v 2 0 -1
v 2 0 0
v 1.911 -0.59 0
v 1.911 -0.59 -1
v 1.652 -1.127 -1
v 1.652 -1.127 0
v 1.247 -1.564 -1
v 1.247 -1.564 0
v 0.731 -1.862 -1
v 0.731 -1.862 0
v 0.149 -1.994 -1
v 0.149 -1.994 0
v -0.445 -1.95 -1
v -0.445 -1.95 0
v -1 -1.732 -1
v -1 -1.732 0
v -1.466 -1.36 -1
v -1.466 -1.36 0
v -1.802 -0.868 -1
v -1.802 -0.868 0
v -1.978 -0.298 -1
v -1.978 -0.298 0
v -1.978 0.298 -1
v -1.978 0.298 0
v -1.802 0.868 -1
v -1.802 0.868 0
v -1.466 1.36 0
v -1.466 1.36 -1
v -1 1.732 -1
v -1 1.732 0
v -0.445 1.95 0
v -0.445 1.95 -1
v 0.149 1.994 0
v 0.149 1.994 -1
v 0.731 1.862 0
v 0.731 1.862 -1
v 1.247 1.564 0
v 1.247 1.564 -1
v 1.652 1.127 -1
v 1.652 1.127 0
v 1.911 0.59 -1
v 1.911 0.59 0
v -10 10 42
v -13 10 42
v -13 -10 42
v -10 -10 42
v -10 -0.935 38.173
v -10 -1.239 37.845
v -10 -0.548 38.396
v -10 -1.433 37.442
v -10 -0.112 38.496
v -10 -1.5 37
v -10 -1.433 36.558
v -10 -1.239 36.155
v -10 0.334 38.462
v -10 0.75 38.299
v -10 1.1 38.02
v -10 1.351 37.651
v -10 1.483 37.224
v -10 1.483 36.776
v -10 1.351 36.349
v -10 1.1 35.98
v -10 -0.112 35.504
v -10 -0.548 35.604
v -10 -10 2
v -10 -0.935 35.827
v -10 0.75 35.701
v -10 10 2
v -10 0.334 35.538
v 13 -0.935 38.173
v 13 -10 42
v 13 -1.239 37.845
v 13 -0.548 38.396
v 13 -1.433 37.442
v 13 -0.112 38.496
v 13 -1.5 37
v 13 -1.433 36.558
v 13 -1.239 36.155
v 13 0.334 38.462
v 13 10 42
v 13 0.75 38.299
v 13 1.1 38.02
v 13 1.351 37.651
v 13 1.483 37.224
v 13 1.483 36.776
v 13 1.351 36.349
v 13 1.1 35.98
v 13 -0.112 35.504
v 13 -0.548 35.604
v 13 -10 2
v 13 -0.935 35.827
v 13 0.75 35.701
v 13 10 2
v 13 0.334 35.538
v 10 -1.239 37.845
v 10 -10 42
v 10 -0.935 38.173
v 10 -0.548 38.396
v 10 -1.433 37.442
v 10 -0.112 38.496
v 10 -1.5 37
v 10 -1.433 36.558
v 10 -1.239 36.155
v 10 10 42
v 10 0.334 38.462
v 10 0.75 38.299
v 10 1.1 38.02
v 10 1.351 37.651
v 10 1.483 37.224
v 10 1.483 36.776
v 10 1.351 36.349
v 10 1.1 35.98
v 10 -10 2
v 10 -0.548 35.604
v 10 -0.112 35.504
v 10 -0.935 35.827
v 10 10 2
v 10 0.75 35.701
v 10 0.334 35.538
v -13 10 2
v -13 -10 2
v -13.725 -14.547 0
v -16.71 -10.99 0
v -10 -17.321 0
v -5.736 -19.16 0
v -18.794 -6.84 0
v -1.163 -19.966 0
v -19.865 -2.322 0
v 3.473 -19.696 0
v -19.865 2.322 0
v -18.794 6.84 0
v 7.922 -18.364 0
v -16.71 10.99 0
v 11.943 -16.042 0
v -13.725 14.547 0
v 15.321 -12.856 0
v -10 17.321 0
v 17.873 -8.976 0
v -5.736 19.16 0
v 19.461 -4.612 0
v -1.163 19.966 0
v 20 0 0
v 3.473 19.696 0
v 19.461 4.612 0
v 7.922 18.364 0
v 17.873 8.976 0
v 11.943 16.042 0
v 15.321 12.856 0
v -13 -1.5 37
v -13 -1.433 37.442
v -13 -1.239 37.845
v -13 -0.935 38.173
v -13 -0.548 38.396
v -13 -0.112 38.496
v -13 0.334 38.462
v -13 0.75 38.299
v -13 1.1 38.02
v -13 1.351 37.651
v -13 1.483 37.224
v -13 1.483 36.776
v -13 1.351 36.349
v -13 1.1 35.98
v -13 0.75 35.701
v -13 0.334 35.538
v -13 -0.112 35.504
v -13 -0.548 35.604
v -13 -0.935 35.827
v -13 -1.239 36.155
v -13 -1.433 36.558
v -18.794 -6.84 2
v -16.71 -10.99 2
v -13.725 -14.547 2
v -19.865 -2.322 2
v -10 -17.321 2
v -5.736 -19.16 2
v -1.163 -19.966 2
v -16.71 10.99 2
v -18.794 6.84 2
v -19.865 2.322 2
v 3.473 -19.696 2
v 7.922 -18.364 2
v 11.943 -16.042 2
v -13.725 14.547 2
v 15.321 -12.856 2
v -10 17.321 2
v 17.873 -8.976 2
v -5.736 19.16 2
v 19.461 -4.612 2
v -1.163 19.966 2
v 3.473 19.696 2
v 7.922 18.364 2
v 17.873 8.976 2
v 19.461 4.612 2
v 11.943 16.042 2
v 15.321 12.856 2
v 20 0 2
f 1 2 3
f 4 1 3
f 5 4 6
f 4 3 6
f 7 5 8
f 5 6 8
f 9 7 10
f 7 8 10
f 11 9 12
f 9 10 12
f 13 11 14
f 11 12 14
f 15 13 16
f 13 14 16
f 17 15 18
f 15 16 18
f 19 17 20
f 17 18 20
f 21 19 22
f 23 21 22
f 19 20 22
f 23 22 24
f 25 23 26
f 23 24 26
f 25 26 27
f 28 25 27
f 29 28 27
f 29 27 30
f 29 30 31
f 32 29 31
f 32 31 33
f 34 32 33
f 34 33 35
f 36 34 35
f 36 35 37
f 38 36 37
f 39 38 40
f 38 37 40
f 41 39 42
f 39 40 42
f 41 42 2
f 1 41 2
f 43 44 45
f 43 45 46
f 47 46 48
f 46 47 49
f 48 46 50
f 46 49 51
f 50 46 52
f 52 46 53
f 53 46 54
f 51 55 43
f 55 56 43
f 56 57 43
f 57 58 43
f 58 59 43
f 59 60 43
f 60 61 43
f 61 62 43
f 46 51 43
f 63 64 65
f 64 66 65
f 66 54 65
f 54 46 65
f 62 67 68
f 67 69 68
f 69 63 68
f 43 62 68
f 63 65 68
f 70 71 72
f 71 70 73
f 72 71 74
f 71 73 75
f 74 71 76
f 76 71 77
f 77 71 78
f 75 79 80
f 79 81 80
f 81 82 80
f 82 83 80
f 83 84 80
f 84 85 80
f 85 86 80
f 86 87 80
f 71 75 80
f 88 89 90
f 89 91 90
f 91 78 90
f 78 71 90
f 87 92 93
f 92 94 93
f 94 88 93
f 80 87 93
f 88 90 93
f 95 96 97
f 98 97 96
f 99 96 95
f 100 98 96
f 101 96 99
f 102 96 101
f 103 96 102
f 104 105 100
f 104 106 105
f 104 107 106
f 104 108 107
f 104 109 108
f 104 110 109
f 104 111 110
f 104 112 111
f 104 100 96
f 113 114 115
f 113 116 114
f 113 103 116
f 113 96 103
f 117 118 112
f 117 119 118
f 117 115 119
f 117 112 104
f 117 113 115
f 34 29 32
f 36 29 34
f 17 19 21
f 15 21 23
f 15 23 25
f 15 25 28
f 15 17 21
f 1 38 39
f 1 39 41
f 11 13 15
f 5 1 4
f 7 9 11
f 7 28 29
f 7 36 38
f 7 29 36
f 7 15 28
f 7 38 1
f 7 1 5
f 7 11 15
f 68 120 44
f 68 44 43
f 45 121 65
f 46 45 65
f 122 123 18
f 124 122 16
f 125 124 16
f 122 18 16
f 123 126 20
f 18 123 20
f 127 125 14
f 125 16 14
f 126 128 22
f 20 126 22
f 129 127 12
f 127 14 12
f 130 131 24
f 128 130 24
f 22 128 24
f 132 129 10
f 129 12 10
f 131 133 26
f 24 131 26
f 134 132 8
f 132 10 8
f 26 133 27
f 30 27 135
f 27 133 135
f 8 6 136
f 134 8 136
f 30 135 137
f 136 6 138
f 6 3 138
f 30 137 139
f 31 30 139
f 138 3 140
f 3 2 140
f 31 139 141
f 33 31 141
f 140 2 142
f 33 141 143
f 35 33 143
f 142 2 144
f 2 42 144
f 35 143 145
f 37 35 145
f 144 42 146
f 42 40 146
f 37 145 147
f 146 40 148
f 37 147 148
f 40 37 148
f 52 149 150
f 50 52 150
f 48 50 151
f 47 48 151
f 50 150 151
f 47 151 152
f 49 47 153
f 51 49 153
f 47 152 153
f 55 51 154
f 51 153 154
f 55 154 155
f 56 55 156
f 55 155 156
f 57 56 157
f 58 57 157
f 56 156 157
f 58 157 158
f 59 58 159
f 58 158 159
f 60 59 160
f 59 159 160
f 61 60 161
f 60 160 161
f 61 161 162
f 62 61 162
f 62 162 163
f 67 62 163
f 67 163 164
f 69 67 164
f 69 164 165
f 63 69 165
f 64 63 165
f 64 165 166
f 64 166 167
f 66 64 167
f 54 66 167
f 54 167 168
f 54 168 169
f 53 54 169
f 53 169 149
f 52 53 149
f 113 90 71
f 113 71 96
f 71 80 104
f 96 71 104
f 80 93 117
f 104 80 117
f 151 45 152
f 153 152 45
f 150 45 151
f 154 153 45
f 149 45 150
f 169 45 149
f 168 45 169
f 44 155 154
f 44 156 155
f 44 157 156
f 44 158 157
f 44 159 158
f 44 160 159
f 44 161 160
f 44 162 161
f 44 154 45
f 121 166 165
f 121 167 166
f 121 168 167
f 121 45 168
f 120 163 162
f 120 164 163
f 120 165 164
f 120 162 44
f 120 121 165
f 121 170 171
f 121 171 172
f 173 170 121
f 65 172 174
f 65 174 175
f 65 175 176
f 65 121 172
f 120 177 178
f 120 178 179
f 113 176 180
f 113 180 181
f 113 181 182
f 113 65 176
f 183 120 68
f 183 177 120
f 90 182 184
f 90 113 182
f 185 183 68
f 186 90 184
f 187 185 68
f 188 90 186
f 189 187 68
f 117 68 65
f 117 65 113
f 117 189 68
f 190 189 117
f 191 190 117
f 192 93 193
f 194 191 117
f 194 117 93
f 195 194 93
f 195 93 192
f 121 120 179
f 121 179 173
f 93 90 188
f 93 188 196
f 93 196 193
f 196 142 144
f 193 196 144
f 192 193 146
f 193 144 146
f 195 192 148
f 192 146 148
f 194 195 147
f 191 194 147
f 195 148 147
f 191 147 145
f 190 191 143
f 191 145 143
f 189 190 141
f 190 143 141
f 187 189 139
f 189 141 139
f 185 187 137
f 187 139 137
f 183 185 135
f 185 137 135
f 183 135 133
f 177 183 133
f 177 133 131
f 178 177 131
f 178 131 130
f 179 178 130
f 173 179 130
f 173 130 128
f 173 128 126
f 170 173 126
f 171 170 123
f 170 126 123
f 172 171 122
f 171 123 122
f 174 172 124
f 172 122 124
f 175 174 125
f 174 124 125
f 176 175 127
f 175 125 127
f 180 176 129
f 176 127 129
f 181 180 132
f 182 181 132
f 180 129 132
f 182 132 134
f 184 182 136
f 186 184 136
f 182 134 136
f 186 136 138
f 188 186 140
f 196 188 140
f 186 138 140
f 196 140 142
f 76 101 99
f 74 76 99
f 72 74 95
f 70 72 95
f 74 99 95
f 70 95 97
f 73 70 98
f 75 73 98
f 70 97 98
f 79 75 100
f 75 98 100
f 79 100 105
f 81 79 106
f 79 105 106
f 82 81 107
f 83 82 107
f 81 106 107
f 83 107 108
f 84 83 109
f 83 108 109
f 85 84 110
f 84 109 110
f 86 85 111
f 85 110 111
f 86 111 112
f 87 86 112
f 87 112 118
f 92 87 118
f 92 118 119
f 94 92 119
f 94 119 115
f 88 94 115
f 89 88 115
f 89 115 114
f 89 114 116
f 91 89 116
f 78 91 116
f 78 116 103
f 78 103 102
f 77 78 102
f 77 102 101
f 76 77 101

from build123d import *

# Parameters (mm, degrees)
SKETCH1_R           = 20
BOSS_EXTRUDE1_DEPTH = 2
SKETCH2_R           = 2
BOSS_EXTRUDE2_DEPTH = 1
SKETCH3_W           = 3
SKETCH3_H           = 20
BOSS_EXTRUDE3_DEPTH = 40
SKETCH5_R           = 1.5
CUT_EXTRUDE1_DEPTH  = 58.035076926


with BuildPart() as part:
    # Sketch1 → Boss-Extrude1 (new body)
    with BuildSketch(Plane.XY):
        Circle(SKETCH1_R)
    extrude(amount=BOSS_EXTRUDE1_DEPTH)

    # Sketch2 → Boss-Extrude2 (add)
    with BuildSketch(Plane(origin=(0, 0, 0), x_dir=(-1, 0, 0), z_dir=(0, 0, -1))):
        with Locations(Location((0, 0, 0), (0, 0, 180))):
            Circle(SKETCH2_R)
    extrude(amount=BOSS_EXTRUDE2_DEPTH)

    # Sketch3 → Boss-Extrude3 (add)
    with BuildSketch(Plane.XY.offset(2)):
        with Locations((-11.5, 0)):
            Rectangle(SKETCH3_W, SKETCH3_H)
    boss_extrude3 = extrude(amount=BOSS_EXTRUDE3_DEPTH)

    # Mirror1: Boss-Extrude3 across plane
    add(boss_extrude3.mirror(Plane(origin=(0, 0, 0), x_dir=(0, 0, 1), z_dir=(1, 0, 0))))

    # Sketch5 → Cut-Extrude1 (cut, through all)
    with BuildSketch(Plane.ZY.offset(13)):
        with Locations(Location((37, 0, 0), (0, 0, 270))):
            Circle(SKETCH5_R)
    extrude(amount=-CUT_EXTRUDE1_DEPTH, mode=Mode.SUBTRACT)


solid = part.part
